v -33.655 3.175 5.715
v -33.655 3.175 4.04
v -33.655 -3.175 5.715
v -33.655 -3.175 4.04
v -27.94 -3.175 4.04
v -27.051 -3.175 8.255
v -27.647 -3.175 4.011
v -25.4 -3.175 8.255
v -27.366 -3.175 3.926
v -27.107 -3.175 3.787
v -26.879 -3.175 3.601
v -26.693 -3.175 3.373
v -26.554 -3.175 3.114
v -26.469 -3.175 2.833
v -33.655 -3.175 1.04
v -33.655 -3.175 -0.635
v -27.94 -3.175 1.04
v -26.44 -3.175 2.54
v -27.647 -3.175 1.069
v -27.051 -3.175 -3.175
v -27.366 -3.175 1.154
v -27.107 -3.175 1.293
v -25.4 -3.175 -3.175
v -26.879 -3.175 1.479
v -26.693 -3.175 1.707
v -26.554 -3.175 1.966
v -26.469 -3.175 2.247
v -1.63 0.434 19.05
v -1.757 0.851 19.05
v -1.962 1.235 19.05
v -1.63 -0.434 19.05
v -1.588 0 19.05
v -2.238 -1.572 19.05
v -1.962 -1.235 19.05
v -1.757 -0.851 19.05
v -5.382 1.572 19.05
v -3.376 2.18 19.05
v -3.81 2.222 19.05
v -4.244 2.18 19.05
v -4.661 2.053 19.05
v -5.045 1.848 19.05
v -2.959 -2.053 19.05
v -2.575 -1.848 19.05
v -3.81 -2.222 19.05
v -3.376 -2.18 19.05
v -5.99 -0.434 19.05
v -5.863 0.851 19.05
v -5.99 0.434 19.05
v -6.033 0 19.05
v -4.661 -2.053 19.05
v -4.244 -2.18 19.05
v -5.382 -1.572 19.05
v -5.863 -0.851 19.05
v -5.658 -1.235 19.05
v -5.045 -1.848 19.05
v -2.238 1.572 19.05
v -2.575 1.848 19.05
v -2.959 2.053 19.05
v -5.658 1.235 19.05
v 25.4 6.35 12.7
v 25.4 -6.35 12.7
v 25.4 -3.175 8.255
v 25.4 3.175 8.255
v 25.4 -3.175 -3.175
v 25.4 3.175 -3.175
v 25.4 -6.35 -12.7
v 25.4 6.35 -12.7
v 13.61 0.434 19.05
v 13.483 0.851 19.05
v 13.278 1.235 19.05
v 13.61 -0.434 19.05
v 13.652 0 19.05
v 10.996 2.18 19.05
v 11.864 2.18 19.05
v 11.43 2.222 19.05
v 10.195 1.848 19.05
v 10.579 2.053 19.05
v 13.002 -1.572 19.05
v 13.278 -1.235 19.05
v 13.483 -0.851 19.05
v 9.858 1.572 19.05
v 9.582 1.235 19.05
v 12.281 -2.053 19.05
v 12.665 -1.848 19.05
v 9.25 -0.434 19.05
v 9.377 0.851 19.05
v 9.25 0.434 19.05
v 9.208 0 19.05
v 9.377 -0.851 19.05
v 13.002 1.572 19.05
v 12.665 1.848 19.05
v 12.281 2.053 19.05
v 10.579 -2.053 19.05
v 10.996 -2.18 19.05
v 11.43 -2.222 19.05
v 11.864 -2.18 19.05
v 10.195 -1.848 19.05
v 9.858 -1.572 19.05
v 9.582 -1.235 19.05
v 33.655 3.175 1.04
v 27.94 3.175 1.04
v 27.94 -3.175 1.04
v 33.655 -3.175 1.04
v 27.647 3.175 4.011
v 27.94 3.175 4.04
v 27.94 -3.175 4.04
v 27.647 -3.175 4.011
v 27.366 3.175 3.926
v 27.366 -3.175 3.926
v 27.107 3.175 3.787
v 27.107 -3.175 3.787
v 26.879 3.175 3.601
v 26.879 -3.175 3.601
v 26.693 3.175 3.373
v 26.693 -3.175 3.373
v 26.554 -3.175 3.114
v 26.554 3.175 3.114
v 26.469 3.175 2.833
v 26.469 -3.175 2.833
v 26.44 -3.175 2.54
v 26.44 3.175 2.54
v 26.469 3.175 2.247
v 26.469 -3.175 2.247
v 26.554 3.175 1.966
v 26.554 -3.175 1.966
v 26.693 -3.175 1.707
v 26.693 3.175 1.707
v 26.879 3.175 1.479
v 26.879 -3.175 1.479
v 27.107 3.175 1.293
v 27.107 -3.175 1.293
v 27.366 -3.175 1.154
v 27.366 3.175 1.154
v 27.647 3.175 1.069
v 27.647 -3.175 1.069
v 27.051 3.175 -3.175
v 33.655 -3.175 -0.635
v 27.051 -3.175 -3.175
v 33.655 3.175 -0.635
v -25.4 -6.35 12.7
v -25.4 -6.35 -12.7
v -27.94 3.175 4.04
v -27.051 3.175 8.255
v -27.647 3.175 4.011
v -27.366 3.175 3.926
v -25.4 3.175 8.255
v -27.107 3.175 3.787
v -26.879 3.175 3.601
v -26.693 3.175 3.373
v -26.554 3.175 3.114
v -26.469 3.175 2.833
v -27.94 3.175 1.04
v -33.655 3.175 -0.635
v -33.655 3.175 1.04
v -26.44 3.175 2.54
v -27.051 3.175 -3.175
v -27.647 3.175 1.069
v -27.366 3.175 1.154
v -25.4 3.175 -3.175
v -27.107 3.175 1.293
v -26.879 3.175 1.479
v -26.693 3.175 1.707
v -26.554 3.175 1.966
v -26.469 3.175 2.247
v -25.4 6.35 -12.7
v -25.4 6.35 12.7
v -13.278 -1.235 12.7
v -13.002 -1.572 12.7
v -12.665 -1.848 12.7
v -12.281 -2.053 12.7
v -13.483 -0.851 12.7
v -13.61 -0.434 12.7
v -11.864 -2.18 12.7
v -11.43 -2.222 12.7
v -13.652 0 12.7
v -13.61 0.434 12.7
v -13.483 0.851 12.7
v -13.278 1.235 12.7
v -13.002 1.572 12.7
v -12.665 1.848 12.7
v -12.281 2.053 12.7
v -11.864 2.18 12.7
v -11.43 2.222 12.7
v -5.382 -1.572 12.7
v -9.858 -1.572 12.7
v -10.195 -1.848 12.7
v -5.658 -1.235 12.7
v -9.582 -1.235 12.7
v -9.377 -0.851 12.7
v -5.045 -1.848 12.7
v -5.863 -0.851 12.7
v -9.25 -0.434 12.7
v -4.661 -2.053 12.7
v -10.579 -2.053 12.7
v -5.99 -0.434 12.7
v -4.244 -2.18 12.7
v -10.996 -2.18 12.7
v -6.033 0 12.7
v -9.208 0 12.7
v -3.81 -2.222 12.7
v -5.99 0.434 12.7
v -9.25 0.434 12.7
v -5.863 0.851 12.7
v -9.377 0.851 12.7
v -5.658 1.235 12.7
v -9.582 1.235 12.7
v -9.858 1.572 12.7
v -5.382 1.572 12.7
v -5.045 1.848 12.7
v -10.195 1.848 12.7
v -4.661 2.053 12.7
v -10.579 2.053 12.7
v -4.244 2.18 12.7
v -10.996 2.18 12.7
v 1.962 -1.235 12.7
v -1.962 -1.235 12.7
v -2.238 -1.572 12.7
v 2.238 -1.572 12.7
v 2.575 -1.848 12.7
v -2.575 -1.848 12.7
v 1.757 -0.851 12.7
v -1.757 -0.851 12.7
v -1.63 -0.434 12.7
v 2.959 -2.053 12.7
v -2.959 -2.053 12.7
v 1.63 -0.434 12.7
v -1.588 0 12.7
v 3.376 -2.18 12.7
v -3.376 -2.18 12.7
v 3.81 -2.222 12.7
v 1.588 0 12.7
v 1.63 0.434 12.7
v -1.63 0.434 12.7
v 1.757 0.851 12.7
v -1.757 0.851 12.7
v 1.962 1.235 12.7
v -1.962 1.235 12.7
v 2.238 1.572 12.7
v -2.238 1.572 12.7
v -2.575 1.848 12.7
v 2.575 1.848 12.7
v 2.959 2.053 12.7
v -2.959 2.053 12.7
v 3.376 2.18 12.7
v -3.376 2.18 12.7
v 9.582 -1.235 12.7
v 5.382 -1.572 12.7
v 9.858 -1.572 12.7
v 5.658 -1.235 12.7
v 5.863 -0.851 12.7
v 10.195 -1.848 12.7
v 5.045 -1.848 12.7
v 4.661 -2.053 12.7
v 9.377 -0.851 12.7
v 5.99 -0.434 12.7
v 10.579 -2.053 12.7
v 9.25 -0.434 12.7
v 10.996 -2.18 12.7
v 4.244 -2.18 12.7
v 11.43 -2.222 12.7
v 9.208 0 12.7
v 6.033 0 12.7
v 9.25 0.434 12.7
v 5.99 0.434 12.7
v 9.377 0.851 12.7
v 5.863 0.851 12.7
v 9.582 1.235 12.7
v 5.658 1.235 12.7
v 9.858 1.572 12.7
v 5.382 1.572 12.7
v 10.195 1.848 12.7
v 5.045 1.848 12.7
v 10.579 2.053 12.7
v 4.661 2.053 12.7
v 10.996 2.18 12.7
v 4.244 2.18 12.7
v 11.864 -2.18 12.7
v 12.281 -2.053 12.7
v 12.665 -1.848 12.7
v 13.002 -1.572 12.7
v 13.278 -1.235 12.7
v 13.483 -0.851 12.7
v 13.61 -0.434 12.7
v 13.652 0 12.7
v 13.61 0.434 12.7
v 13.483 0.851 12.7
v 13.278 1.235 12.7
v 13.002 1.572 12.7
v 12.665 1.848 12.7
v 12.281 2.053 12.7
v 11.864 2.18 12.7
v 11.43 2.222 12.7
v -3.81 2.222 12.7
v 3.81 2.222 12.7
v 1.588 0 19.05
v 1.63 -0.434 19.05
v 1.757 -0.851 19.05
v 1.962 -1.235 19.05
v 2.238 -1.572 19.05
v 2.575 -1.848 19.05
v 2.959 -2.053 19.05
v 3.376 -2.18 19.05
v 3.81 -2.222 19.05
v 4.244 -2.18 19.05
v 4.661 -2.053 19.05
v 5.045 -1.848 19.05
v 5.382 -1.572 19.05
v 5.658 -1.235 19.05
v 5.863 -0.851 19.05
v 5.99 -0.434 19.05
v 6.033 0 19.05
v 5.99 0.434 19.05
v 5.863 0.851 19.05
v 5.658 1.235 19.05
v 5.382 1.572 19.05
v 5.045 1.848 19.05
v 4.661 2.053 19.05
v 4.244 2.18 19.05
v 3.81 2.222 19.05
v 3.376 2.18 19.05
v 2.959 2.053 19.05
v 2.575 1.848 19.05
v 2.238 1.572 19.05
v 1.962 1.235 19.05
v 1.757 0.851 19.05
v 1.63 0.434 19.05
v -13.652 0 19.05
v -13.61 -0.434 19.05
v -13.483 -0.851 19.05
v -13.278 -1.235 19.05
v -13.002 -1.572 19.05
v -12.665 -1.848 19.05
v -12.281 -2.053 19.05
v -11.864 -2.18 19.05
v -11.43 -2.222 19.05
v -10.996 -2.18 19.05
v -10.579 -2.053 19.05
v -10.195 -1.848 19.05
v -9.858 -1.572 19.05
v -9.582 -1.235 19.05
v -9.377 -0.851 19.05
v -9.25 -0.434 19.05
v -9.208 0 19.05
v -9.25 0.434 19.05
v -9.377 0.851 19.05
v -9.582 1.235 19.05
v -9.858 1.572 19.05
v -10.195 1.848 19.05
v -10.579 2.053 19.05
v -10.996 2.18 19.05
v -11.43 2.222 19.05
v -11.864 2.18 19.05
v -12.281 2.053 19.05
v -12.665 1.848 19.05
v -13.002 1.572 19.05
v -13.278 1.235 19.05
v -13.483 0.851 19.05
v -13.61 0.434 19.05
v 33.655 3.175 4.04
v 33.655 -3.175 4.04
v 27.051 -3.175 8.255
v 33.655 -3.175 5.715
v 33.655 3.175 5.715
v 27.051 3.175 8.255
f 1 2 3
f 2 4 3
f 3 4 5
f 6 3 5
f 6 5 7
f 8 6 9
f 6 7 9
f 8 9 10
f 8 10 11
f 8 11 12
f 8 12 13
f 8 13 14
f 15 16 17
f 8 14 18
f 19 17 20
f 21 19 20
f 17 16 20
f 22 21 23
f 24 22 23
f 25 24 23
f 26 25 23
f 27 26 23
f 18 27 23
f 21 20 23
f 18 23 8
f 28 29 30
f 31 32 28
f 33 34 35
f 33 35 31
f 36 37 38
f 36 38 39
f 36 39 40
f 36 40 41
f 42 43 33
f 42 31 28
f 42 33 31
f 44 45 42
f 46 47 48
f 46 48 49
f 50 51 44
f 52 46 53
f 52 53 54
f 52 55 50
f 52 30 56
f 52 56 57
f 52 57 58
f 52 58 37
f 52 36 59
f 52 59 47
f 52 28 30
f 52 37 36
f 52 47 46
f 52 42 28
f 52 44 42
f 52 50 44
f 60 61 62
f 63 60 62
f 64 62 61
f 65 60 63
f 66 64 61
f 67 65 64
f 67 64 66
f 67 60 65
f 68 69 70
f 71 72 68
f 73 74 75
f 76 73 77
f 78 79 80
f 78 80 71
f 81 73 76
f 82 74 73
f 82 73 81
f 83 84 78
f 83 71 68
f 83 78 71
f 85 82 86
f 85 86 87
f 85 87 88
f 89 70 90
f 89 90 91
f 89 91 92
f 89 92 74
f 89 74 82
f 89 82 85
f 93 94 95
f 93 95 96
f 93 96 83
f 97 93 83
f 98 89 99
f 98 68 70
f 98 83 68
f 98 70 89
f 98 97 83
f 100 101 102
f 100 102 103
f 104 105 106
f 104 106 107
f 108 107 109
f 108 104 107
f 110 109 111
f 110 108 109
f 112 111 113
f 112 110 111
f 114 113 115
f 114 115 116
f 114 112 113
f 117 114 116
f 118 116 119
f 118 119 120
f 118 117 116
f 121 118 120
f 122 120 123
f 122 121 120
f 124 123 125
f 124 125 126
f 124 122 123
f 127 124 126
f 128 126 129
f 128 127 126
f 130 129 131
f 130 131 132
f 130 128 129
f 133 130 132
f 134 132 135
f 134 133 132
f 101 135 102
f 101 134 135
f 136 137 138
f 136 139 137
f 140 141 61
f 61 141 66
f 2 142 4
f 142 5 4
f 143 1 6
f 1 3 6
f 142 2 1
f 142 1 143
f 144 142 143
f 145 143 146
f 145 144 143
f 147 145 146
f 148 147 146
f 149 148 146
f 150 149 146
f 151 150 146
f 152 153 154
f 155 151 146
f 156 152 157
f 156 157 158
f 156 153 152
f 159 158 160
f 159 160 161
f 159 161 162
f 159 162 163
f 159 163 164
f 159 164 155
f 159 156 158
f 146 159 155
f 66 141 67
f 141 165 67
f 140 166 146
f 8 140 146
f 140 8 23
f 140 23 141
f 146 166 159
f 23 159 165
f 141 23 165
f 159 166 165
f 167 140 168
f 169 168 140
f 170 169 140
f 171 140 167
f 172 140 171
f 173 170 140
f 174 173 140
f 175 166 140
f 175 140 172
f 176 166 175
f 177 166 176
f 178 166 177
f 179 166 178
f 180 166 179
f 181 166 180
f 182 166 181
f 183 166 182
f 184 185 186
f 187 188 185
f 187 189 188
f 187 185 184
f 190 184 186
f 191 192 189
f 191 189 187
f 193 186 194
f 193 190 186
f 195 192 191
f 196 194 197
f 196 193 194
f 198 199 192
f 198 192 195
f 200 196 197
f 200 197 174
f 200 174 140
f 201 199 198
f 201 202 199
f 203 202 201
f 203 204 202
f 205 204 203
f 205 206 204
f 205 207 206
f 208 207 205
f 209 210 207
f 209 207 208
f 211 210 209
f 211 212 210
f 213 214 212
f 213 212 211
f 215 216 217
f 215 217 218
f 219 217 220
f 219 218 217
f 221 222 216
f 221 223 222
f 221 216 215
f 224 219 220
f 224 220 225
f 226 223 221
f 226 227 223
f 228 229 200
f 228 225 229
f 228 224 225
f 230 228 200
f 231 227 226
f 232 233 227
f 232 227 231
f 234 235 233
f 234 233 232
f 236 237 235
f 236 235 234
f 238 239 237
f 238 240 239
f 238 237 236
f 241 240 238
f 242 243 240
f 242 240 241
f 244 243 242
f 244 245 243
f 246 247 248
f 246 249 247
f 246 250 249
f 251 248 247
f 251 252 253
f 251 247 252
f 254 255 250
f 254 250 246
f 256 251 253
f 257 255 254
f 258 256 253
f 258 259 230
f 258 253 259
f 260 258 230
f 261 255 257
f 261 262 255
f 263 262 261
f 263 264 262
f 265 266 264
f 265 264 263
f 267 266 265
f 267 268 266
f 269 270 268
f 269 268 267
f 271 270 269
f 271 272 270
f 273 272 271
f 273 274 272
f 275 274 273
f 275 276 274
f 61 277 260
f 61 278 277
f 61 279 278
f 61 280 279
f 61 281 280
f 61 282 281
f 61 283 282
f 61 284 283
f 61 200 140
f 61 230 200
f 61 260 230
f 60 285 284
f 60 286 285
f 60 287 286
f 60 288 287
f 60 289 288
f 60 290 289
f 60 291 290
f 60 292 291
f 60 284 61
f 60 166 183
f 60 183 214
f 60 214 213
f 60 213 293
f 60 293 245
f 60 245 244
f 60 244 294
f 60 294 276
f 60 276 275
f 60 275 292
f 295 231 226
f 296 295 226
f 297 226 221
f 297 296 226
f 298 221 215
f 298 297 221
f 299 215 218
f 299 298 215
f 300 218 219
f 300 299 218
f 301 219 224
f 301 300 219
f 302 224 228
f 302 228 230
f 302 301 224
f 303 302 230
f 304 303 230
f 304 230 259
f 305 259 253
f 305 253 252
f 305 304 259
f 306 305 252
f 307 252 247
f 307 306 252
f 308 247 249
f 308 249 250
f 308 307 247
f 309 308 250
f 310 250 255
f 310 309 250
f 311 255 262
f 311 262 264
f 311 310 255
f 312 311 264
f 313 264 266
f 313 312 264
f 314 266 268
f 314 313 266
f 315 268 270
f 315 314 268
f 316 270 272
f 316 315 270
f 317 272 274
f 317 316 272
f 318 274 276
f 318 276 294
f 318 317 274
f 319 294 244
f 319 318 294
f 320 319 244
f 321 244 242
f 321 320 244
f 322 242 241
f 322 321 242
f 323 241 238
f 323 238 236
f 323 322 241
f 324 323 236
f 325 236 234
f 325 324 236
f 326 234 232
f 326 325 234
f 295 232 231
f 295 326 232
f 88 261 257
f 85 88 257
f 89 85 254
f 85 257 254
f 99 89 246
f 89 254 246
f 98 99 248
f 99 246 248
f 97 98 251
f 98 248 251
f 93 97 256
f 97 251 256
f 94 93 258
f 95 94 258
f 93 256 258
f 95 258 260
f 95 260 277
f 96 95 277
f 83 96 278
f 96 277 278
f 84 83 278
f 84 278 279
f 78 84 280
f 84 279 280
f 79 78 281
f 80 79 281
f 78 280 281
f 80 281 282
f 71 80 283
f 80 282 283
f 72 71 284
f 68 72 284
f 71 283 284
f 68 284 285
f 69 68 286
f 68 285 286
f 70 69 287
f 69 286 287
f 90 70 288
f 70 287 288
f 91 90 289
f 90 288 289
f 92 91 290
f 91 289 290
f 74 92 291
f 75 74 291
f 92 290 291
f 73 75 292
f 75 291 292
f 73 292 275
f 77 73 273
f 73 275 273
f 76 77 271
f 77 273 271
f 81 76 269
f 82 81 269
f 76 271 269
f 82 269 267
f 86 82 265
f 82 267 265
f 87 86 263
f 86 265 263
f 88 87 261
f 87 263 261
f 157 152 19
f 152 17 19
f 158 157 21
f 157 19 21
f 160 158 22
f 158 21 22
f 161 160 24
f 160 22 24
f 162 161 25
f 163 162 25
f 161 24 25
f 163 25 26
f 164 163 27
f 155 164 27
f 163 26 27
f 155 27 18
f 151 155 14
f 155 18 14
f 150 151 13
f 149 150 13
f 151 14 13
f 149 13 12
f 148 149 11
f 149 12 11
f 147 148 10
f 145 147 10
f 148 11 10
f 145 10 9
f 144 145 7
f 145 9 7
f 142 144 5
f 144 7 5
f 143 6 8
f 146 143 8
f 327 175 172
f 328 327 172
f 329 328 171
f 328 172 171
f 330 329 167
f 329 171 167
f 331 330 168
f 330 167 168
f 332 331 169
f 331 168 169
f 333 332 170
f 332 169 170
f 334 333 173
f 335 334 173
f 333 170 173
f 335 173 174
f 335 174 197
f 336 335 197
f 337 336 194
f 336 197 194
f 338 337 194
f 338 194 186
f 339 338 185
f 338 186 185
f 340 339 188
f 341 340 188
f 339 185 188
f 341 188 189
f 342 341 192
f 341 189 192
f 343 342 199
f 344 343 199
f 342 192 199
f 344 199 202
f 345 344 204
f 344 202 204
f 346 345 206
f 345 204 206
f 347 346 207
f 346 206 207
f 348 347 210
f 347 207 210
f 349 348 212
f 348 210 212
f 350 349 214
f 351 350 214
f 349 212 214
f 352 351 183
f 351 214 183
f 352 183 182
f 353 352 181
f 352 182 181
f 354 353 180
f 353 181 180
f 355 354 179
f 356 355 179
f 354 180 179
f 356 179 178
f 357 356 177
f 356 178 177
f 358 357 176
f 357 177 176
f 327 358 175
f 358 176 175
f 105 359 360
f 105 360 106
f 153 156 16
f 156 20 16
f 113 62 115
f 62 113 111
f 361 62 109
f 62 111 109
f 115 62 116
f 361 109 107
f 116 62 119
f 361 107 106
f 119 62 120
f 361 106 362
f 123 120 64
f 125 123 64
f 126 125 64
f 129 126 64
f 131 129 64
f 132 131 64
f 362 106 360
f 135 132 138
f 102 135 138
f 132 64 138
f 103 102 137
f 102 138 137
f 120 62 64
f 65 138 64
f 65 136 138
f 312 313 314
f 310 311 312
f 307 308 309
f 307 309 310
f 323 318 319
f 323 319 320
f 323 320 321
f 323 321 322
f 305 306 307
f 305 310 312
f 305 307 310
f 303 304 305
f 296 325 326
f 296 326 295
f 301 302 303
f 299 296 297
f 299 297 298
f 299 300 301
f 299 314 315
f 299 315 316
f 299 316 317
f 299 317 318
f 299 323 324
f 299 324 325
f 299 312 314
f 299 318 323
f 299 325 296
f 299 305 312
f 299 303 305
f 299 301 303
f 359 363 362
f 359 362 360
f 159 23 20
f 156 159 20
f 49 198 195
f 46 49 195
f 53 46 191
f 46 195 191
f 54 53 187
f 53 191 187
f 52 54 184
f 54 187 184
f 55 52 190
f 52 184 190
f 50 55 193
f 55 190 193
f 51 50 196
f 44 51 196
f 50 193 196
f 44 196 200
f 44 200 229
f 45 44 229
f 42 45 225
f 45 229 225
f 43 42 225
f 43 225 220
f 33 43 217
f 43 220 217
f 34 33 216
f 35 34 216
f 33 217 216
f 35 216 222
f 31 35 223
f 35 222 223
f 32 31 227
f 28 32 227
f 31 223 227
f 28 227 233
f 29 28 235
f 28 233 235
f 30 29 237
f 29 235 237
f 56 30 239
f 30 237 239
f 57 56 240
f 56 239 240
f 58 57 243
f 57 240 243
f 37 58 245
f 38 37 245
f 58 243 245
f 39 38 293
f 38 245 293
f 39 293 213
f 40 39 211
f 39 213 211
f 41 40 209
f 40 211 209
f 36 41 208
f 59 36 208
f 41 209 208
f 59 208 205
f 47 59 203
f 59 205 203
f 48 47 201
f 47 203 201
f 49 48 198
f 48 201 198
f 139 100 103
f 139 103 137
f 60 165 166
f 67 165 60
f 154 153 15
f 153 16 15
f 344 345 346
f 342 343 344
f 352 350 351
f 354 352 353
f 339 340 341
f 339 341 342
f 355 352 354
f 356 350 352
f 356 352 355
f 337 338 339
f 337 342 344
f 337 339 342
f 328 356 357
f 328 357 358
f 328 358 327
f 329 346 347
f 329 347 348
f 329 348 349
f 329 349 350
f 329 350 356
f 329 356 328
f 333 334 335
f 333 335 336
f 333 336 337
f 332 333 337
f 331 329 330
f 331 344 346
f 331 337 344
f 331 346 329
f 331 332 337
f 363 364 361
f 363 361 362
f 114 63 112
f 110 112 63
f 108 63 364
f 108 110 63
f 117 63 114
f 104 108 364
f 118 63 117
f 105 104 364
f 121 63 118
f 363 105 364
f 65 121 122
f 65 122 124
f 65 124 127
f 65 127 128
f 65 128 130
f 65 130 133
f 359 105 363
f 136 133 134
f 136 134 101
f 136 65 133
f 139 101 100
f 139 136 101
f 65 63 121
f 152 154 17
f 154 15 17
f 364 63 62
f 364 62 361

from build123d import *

# Parameters (mm, degrees)
SKETCH1_W           = 50.8
SKETCH1_H           = 25.4
BOSS_EXTRUDE1_DEPTH = 6.35
BOSS_EXTRUDE2_DEPTH = 3.175
SKETCH3_R           = 2.2225
BOSS_EXTRUDE3_DEPTH = 6.35


with BuildPart() as part:
    # Sketch1 → Boss-Extrude1 (new, symmetric)
    with BuildSketch(Plane(origin=(0, 0, 0), x_dir=(1, 0, 0), z_dir=(0, 1, 0))):
        Rectangle(SKETCH1_W, SKETCH1_H)
    extrude(amount=BOSS_EXTRUDE1_DEPTH, both=True)

    # Sketch2 → Boss-Extrude2 (add, symmetric)
    with BuildSketch(Plane(origin=(0, 0, 0), x_dir=(1, 0, 0), z_dir=(0, 1, 0))):
        with BuildLine():
            Line((-25.4, 3.175), (-27.051, 3.175))
            Line((-27.051, 3.175), (-33.655, 0.635))
            Line((-33.655, 0.635), (-33.655, -1.04))
            Line((-33.655, -1.04), (-27.94, -1.04))
            ThreePointArc((-27.94, -1.04), (-26.44, -2.54), (-27.94, -4.04))
            Line((-27.94, -4.04), (-33.655, -4.04))
            Line((-33.655, -4.04), (-33.655, -5.715))
            Line((-33.655, -5.715), (-27.051, -8.255))
            Line((-27.051, -8.255), (-25.4, -8.255))
            Line((-25.4, -8.255), (-25.4, 3.175))
        make_face()
        with BuildLine():
            Line((25.4, 3.175), (25.4, -8.255))
            Line((25.4, -8.255), (27.051, -8.255))
            Line((27.051, -8.255), (33.655, -5.715))
            Line((33.655, -5.715), (33.655, -4.04))
            Line((33.655, -4.04), (27.94, -4.04))
            ThreePointArc((27.94, -4.04), (26.44, -2.54), (27.94, -1.04))
            Line((27.94, -1.04), (33.655, -1.04))
            Line((33.655, -1.04), (33.655, 0.635))
            Line((33.655, 0.635), (27.051, 3.175))
            Line((27.051, 3.175), (25.4, 3.175))
        make_face()
    extrude(amount=BOSS_EXTRUDE2_DEPTH, both=True)

    # Sketch3 → Boss-Extrude3 (add, symmetric)
    with BuildSketch(Plane.XY.offset(12.7)):
        with Locations(Location((-3.81, 0, 0), (0, 0, 180))):
            Circle(SKETCH3_R)
        with Locations(Location((-11.43, 0, 0), (0, 0, 180))):
            Circle(SKETCH3_R)
        with Locations(Location((11.43, 0, 0), (0, 0, 180))):
            Circle(SKETCH3_R)
        with Locations(Location((3.81, 0, 0), (0, 0, 180))):
            Circle(SKETCH3_R)
    extrude(amount=BOSS_EXTRUDE3_DEPTH, both=True)


solid = part.part
